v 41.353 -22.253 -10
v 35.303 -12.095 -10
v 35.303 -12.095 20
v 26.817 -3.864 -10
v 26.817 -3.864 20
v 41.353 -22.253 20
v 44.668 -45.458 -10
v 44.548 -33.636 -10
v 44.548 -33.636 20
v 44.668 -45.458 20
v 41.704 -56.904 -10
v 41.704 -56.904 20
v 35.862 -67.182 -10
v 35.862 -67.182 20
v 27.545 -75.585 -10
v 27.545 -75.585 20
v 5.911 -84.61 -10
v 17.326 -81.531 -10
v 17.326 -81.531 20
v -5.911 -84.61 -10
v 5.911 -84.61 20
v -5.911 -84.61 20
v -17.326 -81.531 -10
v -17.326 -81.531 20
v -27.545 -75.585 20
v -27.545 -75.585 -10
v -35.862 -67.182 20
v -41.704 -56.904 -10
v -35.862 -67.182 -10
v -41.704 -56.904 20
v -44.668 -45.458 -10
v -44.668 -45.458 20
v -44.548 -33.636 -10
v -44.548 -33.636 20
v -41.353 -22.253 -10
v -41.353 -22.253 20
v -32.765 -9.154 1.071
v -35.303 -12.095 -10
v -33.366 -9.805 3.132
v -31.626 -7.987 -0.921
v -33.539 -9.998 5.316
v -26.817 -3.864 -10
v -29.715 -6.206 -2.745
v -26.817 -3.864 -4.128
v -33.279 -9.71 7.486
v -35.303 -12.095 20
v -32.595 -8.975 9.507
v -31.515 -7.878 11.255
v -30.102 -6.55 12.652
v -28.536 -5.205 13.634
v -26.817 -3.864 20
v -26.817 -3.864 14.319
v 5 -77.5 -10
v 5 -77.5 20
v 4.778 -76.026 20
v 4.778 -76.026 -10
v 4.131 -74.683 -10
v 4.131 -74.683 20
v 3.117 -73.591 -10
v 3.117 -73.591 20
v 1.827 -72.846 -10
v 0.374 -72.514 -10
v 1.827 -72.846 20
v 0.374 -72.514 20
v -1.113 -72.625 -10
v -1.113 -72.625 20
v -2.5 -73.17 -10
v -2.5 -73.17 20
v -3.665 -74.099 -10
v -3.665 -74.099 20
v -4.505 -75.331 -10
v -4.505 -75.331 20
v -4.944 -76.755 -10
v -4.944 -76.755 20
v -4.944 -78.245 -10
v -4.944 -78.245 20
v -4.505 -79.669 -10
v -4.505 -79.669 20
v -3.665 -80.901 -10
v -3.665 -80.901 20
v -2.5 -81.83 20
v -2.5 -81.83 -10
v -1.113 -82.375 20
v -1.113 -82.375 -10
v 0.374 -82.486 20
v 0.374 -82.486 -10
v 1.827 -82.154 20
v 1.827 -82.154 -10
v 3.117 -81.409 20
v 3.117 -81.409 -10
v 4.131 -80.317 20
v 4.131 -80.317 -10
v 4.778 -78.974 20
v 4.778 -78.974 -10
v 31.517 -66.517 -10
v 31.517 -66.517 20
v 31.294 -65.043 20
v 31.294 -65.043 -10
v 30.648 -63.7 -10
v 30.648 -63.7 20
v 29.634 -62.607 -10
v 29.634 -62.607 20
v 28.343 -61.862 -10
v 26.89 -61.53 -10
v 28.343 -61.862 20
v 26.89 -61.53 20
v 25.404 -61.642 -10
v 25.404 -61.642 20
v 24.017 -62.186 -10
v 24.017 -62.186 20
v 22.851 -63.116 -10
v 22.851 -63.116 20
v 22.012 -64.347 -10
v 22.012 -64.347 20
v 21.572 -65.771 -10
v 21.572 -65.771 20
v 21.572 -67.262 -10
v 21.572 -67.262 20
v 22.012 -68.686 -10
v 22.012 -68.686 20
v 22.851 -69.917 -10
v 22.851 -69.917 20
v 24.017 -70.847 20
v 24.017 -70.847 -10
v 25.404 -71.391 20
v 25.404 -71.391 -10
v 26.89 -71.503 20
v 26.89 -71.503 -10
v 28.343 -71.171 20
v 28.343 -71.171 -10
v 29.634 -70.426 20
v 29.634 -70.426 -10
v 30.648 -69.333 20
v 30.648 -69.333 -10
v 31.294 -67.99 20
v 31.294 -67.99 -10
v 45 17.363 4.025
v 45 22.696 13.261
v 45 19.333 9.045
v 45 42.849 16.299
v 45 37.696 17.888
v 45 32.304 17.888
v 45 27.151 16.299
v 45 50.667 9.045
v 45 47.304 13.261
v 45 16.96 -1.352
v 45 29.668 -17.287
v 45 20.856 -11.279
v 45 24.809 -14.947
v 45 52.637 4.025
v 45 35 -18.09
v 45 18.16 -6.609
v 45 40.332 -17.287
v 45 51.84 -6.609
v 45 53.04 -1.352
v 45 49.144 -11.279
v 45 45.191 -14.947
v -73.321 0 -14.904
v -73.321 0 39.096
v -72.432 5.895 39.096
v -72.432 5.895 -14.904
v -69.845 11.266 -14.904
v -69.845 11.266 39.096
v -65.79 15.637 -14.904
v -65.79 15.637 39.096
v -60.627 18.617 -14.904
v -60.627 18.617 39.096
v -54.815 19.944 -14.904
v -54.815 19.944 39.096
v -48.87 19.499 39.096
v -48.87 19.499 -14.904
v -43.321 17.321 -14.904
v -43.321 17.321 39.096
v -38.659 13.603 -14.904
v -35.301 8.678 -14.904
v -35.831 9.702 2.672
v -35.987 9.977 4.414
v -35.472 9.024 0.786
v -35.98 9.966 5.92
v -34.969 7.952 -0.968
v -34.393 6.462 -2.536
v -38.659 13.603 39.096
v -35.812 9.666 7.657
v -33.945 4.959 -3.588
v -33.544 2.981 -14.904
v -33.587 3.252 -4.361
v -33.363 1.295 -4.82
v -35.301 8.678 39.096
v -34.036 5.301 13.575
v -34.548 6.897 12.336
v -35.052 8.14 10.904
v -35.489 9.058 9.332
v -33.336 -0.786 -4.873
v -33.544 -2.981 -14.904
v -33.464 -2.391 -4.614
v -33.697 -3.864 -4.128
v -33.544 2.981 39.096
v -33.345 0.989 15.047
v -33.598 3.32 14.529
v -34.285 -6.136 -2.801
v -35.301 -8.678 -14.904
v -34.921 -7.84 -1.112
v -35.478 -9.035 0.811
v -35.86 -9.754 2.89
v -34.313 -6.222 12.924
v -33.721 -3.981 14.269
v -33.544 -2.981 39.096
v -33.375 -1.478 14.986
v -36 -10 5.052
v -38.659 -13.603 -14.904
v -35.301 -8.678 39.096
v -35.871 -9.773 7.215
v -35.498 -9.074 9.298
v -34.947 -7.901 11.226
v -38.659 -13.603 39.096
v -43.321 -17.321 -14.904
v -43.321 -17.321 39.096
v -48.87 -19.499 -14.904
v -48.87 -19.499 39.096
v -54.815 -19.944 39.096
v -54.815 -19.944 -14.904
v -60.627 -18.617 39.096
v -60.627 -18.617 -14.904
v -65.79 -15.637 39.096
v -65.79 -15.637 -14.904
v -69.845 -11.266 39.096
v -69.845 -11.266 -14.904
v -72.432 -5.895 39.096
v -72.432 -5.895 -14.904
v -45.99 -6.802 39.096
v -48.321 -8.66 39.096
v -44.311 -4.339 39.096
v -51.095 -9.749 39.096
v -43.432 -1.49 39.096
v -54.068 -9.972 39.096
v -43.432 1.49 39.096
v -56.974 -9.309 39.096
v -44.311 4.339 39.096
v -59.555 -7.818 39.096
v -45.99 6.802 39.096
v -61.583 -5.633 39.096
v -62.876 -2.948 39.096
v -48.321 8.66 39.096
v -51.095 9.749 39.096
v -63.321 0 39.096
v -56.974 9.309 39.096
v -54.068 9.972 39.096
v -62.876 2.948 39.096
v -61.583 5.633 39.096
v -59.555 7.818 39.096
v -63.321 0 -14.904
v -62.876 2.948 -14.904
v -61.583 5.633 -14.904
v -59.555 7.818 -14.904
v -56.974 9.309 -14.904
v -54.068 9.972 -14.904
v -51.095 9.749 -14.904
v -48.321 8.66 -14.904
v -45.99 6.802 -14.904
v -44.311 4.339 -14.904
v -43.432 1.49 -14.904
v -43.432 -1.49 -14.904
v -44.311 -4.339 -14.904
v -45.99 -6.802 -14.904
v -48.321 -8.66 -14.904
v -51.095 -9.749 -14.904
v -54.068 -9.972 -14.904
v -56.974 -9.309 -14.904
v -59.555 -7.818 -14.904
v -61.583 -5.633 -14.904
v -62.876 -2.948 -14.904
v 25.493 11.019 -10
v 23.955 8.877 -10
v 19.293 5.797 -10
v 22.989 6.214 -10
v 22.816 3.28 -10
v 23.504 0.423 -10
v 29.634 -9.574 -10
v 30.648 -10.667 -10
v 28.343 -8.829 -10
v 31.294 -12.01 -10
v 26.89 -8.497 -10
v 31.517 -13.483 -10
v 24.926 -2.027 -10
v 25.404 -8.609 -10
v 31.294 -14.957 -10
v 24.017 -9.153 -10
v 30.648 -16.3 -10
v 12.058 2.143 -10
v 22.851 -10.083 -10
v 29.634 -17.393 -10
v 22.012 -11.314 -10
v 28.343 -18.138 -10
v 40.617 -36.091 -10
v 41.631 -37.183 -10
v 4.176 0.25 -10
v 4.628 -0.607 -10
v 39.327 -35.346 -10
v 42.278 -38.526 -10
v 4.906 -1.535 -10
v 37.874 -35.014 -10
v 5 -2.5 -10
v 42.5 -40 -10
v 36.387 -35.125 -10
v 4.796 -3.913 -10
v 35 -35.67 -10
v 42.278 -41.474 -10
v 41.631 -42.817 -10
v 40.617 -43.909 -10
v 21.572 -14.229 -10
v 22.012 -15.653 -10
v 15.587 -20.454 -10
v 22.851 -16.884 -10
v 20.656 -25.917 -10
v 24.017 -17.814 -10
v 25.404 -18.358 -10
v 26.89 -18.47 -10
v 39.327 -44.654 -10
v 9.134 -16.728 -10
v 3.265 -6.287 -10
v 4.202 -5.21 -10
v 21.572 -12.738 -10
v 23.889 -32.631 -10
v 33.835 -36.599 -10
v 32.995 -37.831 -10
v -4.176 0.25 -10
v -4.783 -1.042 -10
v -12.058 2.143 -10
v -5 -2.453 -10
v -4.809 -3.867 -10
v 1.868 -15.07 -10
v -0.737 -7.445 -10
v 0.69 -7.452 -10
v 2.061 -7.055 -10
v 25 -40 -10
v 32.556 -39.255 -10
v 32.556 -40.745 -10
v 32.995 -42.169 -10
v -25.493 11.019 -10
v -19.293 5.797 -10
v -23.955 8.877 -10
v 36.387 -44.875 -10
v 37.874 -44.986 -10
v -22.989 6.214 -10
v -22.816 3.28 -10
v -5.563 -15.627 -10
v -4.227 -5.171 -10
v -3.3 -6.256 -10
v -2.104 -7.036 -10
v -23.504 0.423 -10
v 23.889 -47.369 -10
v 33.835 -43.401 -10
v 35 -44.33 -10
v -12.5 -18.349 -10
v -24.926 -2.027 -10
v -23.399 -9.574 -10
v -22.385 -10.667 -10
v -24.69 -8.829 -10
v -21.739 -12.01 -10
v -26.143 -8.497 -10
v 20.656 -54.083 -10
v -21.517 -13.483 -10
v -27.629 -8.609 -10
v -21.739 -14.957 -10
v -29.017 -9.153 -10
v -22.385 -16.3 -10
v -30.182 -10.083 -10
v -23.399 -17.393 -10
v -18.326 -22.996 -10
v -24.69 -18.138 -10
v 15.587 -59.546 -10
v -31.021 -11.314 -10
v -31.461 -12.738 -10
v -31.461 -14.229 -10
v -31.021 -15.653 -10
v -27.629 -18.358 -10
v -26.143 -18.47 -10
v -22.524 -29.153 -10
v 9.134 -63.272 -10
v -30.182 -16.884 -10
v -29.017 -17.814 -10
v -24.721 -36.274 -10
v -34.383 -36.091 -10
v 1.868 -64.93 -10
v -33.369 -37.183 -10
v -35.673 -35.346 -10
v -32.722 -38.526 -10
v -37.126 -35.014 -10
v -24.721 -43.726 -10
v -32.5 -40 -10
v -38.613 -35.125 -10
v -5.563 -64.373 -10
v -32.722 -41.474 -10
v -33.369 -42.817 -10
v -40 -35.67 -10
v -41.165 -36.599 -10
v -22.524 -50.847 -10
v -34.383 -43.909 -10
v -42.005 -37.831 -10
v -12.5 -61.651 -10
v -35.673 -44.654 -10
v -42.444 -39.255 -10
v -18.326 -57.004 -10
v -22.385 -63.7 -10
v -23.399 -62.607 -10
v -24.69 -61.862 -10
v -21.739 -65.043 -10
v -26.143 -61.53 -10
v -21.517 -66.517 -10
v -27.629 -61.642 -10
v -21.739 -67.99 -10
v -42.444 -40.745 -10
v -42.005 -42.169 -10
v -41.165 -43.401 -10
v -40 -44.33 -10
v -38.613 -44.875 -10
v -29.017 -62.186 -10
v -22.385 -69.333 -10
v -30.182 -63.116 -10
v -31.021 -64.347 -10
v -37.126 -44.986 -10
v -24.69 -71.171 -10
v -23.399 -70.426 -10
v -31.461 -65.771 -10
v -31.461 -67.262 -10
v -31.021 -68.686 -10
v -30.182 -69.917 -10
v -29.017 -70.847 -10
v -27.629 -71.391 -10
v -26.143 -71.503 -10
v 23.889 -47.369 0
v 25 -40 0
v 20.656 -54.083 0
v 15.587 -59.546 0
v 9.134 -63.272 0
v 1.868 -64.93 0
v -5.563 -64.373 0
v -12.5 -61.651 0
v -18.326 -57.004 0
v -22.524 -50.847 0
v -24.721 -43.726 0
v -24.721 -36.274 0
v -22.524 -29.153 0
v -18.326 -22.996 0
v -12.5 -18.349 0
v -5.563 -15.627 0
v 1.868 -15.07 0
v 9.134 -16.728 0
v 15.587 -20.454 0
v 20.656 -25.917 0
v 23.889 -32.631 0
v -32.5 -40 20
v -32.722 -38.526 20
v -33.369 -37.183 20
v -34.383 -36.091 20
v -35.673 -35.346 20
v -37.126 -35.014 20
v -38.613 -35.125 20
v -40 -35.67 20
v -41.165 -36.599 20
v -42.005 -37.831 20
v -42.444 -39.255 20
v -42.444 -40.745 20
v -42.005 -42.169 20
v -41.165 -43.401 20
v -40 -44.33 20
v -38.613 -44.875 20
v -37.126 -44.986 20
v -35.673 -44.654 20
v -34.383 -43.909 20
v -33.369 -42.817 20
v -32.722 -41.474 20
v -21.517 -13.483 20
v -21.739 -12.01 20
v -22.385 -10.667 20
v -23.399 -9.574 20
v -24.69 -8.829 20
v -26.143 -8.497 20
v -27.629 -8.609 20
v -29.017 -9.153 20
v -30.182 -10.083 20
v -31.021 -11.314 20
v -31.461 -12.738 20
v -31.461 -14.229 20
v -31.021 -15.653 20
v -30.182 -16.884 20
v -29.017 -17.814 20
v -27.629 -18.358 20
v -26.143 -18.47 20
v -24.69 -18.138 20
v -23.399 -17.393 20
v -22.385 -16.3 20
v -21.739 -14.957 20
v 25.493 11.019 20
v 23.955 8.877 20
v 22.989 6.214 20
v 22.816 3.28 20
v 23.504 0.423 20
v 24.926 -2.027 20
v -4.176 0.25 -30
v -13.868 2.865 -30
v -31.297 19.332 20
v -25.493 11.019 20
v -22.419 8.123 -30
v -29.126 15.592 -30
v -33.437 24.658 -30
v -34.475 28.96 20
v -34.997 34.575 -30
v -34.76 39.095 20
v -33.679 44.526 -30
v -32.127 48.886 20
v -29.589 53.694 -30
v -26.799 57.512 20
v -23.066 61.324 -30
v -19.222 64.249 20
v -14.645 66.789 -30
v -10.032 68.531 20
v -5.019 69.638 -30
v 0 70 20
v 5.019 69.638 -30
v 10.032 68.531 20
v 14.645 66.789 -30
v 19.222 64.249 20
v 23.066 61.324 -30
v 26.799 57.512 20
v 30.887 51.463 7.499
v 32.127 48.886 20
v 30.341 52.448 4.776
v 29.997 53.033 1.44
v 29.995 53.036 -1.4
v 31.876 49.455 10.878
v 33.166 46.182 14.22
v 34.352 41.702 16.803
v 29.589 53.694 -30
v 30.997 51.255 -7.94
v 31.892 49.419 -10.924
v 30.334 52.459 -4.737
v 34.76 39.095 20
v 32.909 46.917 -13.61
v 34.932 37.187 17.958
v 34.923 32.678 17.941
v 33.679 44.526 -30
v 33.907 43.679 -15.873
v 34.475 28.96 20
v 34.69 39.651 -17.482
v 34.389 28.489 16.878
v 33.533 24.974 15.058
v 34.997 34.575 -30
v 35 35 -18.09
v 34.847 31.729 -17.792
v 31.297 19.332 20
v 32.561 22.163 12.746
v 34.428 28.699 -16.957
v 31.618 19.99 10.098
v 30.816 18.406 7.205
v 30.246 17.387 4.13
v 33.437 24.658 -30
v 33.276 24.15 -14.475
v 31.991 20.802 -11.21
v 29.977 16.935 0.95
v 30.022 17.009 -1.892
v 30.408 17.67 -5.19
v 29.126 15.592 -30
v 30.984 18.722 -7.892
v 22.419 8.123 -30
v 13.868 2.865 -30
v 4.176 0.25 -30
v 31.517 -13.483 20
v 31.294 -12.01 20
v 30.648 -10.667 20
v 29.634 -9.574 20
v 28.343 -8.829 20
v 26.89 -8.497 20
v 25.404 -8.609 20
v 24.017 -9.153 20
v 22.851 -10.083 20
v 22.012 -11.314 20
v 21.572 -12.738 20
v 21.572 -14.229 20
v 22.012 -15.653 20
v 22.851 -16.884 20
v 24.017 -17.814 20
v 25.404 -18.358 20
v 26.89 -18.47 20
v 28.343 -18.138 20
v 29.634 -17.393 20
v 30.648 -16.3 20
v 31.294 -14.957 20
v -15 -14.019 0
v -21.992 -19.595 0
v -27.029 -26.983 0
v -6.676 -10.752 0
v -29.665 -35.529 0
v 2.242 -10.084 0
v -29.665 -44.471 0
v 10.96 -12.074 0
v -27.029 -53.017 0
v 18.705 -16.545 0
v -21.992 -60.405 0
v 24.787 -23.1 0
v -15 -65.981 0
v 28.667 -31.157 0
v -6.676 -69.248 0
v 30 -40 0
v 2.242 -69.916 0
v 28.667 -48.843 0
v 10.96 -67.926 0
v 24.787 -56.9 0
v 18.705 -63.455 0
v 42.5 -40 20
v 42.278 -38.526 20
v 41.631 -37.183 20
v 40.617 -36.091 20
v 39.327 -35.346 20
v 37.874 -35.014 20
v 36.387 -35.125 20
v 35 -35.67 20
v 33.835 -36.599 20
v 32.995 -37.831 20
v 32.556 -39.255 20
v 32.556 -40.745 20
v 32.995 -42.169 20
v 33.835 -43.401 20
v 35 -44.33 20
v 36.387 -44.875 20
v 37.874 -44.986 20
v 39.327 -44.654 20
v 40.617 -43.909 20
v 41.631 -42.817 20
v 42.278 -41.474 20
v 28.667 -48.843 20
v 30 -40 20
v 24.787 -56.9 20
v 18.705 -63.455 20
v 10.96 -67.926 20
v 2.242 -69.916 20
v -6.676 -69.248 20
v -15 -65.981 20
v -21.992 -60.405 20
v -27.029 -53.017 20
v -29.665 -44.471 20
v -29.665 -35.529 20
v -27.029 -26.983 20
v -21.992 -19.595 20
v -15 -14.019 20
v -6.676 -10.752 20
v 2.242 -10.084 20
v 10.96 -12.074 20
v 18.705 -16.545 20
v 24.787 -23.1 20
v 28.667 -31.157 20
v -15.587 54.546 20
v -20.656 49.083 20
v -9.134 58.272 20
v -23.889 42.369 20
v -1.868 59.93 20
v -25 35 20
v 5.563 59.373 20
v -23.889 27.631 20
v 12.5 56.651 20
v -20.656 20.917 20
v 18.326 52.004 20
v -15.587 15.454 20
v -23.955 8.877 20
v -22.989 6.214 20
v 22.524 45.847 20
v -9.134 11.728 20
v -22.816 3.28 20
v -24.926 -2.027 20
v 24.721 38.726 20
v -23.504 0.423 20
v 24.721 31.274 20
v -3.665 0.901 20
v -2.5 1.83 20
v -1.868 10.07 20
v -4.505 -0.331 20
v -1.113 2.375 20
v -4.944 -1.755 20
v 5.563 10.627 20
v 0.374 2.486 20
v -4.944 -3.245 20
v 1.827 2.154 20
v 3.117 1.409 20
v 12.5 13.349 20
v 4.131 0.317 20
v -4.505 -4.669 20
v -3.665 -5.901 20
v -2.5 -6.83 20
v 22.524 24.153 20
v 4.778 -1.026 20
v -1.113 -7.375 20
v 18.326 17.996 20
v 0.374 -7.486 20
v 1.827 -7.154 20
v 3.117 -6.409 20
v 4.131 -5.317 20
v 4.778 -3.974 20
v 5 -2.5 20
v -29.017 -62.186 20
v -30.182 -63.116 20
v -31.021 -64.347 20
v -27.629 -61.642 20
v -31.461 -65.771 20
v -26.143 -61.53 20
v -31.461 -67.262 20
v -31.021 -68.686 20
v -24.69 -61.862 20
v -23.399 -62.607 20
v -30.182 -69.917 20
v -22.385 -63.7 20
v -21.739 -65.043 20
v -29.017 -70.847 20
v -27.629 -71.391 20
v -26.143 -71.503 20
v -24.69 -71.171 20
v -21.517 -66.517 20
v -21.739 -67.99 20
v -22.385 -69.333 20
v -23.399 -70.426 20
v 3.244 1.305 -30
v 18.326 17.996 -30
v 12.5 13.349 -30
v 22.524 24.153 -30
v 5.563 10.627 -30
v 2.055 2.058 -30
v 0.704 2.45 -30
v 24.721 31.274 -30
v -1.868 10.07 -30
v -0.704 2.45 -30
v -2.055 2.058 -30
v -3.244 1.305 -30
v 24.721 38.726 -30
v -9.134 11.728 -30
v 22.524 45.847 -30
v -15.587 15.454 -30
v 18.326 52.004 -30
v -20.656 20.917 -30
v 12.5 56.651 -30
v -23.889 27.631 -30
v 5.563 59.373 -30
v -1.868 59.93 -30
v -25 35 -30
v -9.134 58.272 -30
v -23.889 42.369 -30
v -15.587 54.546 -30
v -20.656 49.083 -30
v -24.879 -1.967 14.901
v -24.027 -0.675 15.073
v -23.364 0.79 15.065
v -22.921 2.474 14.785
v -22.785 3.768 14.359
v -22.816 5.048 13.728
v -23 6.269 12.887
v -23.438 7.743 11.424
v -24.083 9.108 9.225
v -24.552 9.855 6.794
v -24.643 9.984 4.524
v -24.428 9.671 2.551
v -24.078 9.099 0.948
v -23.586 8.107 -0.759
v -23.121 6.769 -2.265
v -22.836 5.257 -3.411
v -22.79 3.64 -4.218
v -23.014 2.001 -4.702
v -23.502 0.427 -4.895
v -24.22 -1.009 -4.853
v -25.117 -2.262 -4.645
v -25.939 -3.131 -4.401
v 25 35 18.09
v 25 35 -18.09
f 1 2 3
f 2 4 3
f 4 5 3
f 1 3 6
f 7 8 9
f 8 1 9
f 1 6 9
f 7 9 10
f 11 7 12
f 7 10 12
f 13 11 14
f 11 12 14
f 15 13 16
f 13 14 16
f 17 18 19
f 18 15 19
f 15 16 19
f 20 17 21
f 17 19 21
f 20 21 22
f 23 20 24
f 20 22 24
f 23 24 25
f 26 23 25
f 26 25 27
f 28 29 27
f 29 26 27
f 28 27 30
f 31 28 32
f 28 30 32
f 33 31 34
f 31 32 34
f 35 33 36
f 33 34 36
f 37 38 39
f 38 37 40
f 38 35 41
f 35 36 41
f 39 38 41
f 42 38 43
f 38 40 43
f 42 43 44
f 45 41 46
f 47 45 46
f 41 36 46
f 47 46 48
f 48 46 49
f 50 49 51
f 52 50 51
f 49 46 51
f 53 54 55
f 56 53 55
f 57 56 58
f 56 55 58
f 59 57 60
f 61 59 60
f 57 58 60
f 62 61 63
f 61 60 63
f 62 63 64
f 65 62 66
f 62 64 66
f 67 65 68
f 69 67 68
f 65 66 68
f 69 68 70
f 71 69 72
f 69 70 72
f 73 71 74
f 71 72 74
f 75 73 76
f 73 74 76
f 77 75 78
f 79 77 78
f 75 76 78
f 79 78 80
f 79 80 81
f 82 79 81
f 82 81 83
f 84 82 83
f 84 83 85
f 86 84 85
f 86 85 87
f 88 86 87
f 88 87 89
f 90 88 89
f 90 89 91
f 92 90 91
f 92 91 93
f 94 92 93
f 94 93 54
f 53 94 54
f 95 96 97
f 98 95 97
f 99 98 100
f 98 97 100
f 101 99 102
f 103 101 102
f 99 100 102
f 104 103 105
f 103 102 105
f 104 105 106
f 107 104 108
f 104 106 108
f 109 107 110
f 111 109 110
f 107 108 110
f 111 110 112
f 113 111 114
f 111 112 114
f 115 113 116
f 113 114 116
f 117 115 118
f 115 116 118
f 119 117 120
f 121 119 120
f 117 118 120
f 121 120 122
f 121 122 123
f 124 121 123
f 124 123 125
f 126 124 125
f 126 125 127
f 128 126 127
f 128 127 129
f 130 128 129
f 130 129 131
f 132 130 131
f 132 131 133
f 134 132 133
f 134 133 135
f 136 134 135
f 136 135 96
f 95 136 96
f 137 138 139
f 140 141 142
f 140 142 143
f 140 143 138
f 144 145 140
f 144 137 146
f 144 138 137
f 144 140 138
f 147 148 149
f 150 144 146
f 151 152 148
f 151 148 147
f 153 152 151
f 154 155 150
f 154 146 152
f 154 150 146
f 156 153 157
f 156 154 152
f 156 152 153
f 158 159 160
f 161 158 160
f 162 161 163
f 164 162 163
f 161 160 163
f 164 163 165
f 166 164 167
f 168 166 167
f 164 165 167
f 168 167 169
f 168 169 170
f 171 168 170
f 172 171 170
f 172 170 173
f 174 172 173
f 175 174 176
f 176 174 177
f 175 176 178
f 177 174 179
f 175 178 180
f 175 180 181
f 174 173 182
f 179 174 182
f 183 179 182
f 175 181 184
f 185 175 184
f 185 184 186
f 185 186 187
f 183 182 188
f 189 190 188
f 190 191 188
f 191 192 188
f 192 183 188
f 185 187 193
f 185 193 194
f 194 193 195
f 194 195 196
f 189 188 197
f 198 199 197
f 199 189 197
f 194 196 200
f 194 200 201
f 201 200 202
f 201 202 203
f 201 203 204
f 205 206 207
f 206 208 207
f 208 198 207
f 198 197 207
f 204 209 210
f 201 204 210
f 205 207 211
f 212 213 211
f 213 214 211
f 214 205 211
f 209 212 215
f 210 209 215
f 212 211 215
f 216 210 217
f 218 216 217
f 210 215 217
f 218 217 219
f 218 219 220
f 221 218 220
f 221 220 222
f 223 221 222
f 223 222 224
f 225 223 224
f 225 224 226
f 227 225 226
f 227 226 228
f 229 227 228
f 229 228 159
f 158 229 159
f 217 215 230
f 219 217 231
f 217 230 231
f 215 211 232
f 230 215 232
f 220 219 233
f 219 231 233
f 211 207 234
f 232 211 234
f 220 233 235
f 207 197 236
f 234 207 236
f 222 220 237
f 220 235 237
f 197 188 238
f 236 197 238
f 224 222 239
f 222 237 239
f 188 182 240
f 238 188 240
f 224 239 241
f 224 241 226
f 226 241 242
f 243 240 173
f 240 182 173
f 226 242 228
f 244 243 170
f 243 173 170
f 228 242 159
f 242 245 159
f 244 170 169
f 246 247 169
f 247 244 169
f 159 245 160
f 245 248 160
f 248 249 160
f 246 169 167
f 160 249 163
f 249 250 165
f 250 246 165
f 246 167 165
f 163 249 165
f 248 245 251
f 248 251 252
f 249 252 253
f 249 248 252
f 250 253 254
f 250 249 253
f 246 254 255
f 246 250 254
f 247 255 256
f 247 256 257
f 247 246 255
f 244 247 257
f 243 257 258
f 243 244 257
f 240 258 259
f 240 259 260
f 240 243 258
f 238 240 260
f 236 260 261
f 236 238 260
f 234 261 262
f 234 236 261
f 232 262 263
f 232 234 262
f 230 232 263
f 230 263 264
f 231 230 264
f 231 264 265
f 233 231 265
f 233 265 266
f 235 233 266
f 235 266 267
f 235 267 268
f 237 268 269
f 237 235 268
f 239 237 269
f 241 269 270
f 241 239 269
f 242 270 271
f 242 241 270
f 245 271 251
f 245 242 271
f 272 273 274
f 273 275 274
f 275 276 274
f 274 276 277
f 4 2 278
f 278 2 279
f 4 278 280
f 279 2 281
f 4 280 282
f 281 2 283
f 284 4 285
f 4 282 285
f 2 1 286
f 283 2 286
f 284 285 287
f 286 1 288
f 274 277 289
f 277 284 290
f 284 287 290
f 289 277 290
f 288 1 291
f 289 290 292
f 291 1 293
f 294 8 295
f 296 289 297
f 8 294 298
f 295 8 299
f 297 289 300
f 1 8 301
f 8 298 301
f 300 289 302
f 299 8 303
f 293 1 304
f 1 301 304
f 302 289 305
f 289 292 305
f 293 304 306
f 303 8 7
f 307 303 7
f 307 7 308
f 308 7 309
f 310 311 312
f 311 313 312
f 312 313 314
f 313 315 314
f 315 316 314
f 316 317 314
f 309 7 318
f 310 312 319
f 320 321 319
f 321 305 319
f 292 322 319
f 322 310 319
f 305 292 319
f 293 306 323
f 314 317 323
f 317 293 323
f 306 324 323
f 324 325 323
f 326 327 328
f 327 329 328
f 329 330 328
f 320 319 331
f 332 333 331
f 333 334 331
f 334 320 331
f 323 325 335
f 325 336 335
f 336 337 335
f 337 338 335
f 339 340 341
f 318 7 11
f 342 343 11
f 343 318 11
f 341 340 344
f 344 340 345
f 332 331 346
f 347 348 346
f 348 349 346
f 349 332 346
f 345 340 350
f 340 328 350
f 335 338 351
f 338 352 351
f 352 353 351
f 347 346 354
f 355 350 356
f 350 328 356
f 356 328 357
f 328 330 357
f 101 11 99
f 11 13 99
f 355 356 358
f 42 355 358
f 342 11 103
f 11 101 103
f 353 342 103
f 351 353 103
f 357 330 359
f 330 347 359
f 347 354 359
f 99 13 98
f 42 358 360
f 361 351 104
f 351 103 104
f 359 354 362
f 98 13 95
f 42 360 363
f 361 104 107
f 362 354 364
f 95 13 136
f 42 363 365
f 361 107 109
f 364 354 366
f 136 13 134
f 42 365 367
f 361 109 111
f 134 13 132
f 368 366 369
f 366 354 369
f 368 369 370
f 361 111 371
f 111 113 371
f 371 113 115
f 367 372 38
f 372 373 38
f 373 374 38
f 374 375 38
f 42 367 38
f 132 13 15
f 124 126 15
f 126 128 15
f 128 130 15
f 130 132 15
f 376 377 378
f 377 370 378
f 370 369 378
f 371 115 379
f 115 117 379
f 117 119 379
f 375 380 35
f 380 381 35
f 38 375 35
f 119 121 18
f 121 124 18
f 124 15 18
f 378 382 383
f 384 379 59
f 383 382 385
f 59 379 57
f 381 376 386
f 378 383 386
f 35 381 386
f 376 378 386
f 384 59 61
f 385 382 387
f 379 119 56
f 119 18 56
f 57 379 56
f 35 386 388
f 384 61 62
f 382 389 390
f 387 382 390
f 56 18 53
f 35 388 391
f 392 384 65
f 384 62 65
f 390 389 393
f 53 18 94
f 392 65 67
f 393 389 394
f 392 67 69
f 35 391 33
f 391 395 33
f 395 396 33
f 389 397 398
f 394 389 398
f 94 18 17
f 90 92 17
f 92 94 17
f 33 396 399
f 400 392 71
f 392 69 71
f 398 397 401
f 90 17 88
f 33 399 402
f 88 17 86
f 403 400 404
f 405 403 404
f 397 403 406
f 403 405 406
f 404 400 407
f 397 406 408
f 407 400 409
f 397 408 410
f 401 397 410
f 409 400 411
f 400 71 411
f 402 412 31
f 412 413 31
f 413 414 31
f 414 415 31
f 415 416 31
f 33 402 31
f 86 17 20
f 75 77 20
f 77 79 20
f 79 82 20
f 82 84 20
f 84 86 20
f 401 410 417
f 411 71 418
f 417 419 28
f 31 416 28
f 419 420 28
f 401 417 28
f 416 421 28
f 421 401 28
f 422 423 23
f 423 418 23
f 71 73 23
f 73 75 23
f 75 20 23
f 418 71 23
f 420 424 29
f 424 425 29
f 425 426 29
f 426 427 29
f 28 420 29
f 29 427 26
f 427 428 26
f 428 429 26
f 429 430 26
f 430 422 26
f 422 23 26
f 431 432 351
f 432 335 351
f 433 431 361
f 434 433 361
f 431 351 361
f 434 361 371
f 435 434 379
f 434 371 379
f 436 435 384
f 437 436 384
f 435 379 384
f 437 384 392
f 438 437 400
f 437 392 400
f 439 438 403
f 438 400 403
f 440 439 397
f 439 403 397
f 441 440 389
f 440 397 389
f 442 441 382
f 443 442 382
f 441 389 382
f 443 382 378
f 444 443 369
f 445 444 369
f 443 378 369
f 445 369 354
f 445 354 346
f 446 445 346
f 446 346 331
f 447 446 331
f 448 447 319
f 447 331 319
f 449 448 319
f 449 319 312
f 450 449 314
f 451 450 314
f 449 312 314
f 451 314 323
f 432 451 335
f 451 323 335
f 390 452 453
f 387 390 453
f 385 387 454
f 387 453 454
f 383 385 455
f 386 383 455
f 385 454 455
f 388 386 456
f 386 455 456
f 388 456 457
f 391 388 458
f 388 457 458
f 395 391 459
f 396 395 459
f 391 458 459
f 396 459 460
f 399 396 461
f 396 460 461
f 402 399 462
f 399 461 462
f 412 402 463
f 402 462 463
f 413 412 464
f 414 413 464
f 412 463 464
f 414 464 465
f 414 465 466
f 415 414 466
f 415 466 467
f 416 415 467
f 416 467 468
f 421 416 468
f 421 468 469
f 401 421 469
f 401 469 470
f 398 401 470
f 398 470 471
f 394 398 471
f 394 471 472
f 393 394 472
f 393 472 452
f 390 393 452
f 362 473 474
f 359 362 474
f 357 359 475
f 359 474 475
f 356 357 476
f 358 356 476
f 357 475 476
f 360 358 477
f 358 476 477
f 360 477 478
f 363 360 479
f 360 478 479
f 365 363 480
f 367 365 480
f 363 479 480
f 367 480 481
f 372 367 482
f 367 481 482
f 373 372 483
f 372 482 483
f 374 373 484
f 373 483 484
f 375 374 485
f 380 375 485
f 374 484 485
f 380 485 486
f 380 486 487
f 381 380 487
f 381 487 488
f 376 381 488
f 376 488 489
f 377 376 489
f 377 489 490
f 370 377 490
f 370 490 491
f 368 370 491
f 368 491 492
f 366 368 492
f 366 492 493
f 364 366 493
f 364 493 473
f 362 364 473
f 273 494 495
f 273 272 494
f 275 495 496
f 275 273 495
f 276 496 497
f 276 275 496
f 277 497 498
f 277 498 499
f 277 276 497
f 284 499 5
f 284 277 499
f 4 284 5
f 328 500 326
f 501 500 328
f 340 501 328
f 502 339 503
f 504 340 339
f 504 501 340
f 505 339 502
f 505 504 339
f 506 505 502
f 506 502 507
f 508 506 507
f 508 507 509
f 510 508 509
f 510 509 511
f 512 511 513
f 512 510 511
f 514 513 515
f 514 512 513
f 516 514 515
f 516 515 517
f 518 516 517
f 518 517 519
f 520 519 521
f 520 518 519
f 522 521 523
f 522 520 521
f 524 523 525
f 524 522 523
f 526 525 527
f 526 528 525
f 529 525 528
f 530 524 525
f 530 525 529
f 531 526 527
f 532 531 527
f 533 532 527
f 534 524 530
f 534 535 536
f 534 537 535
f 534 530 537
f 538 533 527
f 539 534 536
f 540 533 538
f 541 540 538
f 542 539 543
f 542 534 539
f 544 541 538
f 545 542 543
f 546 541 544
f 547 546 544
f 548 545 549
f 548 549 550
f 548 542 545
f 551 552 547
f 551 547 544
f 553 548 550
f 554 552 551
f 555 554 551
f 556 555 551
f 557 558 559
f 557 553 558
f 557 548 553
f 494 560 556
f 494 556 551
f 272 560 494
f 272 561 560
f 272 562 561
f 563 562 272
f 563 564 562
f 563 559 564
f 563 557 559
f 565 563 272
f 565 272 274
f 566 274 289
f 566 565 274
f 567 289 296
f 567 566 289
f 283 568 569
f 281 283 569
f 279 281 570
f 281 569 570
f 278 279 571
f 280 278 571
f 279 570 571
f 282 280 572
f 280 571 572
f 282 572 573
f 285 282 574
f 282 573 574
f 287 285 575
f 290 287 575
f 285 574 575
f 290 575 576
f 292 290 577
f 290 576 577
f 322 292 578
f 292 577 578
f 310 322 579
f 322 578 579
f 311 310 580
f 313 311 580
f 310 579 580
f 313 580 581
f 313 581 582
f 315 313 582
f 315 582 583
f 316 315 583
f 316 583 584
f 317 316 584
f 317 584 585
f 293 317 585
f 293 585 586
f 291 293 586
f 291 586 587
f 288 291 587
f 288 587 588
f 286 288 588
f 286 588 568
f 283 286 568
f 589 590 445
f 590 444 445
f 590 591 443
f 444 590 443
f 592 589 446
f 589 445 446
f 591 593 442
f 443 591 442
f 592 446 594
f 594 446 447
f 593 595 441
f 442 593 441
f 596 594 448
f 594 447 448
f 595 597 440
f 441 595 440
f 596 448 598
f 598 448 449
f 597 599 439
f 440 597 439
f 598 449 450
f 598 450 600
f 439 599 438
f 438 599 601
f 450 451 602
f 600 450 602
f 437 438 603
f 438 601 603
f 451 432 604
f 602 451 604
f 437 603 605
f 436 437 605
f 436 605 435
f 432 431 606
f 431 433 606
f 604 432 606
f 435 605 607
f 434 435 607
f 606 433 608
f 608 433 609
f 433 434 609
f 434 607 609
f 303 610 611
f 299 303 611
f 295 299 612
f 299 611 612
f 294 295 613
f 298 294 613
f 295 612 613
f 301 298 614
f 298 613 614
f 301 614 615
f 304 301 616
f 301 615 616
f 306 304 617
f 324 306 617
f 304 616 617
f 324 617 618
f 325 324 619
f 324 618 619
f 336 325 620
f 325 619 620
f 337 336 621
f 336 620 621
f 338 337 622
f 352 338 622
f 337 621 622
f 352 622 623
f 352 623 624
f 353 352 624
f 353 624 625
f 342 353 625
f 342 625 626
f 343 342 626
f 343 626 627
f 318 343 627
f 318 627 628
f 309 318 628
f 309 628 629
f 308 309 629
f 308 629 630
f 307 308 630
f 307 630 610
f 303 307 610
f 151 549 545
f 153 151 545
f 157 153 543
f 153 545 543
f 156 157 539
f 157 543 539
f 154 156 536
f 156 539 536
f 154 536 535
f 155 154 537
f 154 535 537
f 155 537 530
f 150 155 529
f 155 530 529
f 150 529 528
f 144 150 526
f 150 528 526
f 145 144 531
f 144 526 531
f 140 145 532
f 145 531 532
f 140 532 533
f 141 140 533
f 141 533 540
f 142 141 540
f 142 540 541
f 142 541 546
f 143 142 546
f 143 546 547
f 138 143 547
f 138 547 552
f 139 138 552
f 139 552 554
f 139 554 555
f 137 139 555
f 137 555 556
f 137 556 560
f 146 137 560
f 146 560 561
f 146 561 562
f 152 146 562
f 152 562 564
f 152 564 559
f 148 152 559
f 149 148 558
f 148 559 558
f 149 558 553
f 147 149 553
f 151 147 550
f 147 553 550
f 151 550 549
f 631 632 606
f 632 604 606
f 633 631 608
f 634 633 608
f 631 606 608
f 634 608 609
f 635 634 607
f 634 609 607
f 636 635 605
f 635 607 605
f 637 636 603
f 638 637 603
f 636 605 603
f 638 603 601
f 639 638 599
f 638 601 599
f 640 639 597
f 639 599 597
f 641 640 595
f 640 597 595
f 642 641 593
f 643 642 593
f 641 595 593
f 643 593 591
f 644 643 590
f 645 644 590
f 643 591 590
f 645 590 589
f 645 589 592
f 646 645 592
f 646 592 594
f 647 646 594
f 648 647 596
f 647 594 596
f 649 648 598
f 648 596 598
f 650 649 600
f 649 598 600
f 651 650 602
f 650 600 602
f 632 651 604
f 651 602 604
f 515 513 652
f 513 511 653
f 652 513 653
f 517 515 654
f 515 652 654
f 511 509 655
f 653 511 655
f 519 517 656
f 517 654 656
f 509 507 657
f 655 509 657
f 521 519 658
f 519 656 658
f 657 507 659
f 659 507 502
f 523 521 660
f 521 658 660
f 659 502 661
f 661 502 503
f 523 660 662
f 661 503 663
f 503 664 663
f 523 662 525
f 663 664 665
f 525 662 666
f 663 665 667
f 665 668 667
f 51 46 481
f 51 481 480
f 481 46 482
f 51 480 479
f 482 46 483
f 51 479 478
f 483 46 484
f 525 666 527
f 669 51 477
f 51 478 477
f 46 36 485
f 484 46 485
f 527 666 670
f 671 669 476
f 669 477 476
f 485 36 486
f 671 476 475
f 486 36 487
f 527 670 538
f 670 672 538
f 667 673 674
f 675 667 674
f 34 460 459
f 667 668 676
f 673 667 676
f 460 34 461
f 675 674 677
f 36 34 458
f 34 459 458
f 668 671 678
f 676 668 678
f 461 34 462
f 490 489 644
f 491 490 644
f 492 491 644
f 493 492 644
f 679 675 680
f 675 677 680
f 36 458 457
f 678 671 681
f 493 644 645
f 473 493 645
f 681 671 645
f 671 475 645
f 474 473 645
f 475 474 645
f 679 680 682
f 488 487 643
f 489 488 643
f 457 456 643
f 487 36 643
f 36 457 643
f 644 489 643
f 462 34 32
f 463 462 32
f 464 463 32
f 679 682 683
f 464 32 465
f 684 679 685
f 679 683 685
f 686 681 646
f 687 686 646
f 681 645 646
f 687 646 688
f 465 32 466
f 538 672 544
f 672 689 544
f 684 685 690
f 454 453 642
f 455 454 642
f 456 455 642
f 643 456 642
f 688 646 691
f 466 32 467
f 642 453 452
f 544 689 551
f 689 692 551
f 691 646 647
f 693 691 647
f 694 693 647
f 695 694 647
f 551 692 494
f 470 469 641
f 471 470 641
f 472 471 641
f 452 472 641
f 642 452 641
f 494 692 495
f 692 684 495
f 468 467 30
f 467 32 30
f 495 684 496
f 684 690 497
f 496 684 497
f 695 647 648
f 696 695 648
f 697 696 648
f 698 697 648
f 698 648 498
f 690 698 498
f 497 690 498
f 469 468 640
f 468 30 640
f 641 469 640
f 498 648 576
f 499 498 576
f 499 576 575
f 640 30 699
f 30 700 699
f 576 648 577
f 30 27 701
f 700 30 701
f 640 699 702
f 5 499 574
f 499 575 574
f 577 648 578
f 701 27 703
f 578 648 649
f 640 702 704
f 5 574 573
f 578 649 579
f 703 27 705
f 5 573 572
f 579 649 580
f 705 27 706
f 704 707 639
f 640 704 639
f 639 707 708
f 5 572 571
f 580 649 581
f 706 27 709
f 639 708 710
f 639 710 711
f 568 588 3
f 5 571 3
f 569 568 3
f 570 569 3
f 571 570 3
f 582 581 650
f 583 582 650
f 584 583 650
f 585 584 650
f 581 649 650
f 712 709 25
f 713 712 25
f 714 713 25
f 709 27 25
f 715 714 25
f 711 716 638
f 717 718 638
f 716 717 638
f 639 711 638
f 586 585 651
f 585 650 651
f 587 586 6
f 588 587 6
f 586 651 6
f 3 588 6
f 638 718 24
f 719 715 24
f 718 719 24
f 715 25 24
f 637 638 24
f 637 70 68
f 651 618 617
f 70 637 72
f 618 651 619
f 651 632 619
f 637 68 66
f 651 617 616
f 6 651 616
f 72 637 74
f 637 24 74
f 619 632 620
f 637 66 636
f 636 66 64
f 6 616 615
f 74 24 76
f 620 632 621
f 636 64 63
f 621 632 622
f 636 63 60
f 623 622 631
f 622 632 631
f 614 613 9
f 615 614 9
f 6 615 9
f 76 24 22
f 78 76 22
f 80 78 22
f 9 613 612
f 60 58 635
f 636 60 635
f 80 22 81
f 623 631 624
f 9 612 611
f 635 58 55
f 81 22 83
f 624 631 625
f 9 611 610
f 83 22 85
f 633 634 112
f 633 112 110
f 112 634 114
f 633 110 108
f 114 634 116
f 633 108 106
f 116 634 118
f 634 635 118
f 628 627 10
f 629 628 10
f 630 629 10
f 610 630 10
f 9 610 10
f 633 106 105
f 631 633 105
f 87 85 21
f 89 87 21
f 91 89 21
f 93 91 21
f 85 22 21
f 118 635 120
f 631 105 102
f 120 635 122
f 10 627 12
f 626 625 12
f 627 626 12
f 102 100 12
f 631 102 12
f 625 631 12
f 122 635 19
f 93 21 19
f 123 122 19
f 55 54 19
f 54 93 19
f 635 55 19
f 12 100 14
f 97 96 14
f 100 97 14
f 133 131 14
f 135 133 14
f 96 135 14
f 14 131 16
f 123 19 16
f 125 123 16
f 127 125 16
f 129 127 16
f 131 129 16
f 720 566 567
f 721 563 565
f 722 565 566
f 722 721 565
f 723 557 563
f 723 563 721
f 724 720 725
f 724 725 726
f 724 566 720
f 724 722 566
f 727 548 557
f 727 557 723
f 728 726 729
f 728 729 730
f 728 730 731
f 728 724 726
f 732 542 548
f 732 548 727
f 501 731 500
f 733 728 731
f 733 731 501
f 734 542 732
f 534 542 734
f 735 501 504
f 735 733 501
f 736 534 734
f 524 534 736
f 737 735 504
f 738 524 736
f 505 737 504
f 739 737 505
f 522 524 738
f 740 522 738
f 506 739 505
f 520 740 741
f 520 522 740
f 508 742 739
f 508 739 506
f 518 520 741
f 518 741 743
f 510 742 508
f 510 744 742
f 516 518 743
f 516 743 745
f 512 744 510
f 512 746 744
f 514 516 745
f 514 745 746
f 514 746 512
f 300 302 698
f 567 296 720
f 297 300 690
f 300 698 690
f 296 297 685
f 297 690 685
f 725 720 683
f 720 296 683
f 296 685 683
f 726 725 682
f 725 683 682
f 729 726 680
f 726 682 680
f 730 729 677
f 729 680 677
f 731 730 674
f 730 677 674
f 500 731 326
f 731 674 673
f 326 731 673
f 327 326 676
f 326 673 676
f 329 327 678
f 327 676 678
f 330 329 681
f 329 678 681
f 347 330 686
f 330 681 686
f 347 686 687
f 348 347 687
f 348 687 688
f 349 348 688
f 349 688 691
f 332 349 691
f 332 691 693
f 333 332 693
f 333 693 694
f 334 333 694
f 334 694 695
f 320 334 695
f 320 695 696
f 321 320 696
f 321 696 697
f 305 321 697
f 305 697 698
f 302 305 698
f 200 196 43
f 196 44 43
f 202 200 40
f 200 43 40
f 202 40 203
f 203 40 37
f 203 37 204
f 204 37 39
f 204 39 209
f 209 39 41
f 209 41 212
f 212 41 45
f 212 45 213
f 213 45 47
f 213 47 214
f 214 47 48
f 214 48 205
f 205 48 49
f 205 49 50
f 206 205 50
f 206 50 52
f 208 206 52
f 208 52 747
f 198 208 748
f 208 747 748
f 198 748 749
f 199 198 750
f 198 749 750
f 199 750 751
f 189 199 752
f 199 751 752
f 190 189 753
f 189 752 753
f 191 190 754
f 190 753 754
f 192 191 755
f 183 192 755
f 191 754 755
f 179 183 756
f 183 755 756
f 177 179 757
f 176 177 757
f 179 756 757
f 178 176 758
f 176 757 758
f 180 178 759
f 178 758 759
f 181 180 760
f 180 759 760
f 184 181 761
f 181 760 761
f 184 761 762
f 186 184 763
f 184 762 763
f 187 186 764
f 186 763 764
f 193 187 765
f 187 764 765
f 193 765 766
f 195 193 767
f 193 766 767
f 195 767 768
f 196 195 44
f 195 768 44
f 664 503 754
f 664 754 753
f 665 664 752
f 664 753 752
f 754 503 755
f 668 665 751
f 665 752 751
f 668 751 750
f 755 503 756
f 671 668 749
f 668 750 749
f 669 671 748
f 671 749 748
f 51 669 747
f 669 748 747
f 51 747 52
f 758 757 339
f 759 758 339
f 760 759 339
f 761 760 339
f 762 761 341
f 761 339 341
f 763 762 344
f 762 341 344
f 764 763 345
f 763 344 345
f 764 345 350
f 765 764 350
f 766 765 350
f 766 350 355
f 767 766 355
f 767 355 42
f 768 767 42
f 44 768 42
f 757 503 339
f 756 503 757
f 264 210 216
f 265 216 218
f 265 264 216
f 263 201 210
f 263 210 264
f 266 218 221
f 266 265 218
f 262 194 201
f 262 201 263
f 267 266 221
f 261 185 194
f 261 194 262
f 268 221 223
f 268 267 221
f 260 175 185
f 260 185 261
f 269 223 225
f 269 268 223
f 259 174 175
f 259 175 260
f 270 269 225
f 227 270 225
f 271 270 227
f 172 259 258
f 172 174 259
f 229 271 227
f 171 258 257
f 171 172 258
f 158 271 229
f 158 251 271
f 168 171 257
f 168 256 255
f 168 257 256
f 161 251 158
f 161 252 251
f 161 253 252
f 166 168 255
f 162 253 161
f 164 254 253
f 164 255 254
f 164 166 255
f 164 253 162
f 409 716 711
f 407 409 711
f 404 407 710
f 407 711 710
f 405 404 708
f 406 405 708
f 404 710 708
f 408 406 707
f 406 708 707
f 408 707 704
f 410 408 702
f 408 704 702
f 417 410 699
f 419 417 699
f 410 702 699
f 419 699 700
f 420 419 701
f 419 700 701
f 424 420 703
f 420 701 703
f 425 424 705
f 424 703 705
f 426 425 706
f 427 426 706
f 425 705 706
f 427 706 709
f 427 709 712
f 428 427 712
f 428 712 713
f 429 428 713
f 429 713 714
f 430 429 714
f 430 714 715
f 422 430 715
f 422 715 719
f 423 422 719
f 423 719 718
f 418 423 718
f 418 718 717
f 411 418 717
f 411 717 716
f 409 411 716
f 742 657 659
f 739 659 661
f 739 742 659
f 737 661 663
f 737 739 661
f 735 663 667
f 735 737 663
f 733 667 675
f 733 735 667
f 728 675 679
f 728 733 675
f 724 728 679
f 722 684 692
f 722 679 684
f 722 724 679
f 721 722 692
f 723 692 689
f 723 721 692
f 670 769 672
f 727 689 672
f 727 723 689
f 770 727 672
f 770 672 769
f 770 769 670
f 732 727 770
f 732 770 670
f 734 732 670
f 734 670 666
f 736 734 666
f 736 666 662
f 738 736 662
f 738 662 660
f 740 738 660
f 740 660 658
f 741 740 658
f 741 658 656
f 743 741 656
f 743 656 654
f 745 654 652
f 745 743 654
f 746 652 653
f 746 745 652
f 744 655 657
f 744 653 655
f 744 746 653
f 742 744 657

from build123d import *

# Parameters (mm, degrees)
MOTOR_START                     = -30
MOTOR_HOLDER_DEPTH              = 50
SKETCH11_R                      = 5
SCREW_HOLES_DEPTH               = 109.397416943
FILLET1_R                       = 10
BOSS_EXTRUDE4_DEPTH             = 10
BOSS_EXTRUDE4_DEPTH_BACK        = 10
SKETCH14_R                      = 18.090252651
BOSS_EXTRUDE5_REACH             = 122.52
SKETCH17_R                      = 10
BOSS_EXTRUDE5_DIRECTION_2_DEPTH = 1
BOSS_EXTRUDE6_DEPTH             = 10
BOSS_EXTRUDE6_DEPTH_BACK        = 44
SKETCH18_R                      = 20
SKETCH18_R_2                    = 10


with BuildPart() as part:
    # Sketch1 → motor holder (new body)
    with BuildSketch(Plane.XY.offset(MOTOR_START)):
        with BuildLine():
            Line((-35, 35), (-25, 35))
            ThreePointArc((-25, 35), (0, 10), (25, 35))
            Line((25, 35), (35, 35))
            ThreePointArc((35, 35), (0, 0), (-35, 35))
        make_face()
    motor_holder = extrude(amount=MOTOR_HOLDER_DEPTH)

    # Mirror1: motor holder across plane
    add(motor_holder.mirror(Plane(origin=(25, 35, -30), x_dir=(0, 0, 1), z_dir=(0, -1, 0))))

    # Sketch10 → bearing holder (revolve)
    with BuildSketch(Plane(origin=(0, 0, 0), x_dir=(0, 0, -1), z_dir=(1, 0, 0))):
        Polygon((-20, 5), (-20, -10), (0, -10), (0, -15), (10, -15), (10, 5), align=None)
    revolve(axis=Axis((0, -40, 67.918923046), (0, 0, -1)))

    # Sketch11 → screw holes (cut, through all)
    with BuildSketch(Plane.XY.offset(20)):
        with Locations((0, -77.5)):
            Circle(SKETCH11_R)
        with Locations((-26.516504294, -66.516504294)):
            Circle(SKETCH11_R)
        with Locations((-37.5, -40)):
            Circle(SKETCH11_R)
        with Locations((-26.516504294, -13.483495706)):
            Circle(SKETCH11_R)
        with Locations((0, -2.5)):
            Circle(SKETCH11_R)
        with Locations((26.516504294, -13.483495706)):
            Circle(SKETCH11_R)
        with Locations((37.5, -40)):
            Circle(SKETCH11_R)
        with Locations((26.516504294, -66.516504294)):
            Circle(SKETCH11_R)
    extrude(amount=-SCREW_HOLES_DEPTH, mode=Mode.SUBTRACT)

    # Fillet1
    fillet1_edges = [part.edges().sort_by_distance(p)[0] for p in [
        (-13.795127964, 2.833333333, 5),
        (13.795127964, 2.833333333, 5),
    ]]
    fillet(fillet1_edges, radius=FILLET1_R)

    # Sketch14 → Boss-Extrude4 (add, two sides: drawn at the far end of the back side and taken through both)
    with BuildSketch(Plane(origin=(35, 0, 0), x_dir=(0, 0, -1), z_dir=(1, 0, 0)).offset(-BOSS_EXTRUDE4_DEPTH_BACK)):
        with Locations((0, 35)):
            Circle(SKETCH14_R)
    extrude(amount=BOSS_EXTRUDE4_DEPTH + BOSS_EXTRUDE4_DEPTH_BACK)

    # Sketch17 → Boss-Extrude5 (add, up to next)
    with BuildSketch(Plane.ZY.offset(35), mode=Mode.PRIVATE) as boss_extrude5_sk1:
        with Locations((5.095876685, 0)):
            Circle(SKETCH17_R)
    boss_extrude5_tool1 = extrude(boss_extrude5_sk1.sketch, amount=-BOSS_EXTRUDE5_REACH, mode=Mode.PRIVATE) - part.part
    add(boss_extrude5_tool1.solids().sort_by_distance((-35, 0, 5.095877))[0])

    # Sketch17 → Boss-Extrude5 direction 2 (add)
    with BuildSketch(Plane.ZY.offset(35)):
        with Locations((5.095876685, 0)):
            Circle(SKETCH17_R)
    extrude(amount=BOSS_EXTRUDE5_DIRECTION_2_DEPTH)

    # Sketch18 → Boss-Extrude6 (add, two sides: drawn at the far end of the back side and taken through both)
    with BuildSketch(Plane(origin=(0, 0, -4.904123315), x_dir=(-1, 0, 0), z_dir=(0, 0, -1)).offset(-BOSS_EXTRUDE6_DEPTH_BACK)):
        with Locations((53.320508076, 0)):
            Circle(SKETCH18_R)
        with Locations((53.320508076, 0)):
            Circle(SKETCH18_R_2, mode=Mode.SUBTRACT)
    extrude(amount=BOSS_EXTRUDE6_DEPTH + BOSS_EXTRUDE6_DEPTH_BACK)


solid = part.part
